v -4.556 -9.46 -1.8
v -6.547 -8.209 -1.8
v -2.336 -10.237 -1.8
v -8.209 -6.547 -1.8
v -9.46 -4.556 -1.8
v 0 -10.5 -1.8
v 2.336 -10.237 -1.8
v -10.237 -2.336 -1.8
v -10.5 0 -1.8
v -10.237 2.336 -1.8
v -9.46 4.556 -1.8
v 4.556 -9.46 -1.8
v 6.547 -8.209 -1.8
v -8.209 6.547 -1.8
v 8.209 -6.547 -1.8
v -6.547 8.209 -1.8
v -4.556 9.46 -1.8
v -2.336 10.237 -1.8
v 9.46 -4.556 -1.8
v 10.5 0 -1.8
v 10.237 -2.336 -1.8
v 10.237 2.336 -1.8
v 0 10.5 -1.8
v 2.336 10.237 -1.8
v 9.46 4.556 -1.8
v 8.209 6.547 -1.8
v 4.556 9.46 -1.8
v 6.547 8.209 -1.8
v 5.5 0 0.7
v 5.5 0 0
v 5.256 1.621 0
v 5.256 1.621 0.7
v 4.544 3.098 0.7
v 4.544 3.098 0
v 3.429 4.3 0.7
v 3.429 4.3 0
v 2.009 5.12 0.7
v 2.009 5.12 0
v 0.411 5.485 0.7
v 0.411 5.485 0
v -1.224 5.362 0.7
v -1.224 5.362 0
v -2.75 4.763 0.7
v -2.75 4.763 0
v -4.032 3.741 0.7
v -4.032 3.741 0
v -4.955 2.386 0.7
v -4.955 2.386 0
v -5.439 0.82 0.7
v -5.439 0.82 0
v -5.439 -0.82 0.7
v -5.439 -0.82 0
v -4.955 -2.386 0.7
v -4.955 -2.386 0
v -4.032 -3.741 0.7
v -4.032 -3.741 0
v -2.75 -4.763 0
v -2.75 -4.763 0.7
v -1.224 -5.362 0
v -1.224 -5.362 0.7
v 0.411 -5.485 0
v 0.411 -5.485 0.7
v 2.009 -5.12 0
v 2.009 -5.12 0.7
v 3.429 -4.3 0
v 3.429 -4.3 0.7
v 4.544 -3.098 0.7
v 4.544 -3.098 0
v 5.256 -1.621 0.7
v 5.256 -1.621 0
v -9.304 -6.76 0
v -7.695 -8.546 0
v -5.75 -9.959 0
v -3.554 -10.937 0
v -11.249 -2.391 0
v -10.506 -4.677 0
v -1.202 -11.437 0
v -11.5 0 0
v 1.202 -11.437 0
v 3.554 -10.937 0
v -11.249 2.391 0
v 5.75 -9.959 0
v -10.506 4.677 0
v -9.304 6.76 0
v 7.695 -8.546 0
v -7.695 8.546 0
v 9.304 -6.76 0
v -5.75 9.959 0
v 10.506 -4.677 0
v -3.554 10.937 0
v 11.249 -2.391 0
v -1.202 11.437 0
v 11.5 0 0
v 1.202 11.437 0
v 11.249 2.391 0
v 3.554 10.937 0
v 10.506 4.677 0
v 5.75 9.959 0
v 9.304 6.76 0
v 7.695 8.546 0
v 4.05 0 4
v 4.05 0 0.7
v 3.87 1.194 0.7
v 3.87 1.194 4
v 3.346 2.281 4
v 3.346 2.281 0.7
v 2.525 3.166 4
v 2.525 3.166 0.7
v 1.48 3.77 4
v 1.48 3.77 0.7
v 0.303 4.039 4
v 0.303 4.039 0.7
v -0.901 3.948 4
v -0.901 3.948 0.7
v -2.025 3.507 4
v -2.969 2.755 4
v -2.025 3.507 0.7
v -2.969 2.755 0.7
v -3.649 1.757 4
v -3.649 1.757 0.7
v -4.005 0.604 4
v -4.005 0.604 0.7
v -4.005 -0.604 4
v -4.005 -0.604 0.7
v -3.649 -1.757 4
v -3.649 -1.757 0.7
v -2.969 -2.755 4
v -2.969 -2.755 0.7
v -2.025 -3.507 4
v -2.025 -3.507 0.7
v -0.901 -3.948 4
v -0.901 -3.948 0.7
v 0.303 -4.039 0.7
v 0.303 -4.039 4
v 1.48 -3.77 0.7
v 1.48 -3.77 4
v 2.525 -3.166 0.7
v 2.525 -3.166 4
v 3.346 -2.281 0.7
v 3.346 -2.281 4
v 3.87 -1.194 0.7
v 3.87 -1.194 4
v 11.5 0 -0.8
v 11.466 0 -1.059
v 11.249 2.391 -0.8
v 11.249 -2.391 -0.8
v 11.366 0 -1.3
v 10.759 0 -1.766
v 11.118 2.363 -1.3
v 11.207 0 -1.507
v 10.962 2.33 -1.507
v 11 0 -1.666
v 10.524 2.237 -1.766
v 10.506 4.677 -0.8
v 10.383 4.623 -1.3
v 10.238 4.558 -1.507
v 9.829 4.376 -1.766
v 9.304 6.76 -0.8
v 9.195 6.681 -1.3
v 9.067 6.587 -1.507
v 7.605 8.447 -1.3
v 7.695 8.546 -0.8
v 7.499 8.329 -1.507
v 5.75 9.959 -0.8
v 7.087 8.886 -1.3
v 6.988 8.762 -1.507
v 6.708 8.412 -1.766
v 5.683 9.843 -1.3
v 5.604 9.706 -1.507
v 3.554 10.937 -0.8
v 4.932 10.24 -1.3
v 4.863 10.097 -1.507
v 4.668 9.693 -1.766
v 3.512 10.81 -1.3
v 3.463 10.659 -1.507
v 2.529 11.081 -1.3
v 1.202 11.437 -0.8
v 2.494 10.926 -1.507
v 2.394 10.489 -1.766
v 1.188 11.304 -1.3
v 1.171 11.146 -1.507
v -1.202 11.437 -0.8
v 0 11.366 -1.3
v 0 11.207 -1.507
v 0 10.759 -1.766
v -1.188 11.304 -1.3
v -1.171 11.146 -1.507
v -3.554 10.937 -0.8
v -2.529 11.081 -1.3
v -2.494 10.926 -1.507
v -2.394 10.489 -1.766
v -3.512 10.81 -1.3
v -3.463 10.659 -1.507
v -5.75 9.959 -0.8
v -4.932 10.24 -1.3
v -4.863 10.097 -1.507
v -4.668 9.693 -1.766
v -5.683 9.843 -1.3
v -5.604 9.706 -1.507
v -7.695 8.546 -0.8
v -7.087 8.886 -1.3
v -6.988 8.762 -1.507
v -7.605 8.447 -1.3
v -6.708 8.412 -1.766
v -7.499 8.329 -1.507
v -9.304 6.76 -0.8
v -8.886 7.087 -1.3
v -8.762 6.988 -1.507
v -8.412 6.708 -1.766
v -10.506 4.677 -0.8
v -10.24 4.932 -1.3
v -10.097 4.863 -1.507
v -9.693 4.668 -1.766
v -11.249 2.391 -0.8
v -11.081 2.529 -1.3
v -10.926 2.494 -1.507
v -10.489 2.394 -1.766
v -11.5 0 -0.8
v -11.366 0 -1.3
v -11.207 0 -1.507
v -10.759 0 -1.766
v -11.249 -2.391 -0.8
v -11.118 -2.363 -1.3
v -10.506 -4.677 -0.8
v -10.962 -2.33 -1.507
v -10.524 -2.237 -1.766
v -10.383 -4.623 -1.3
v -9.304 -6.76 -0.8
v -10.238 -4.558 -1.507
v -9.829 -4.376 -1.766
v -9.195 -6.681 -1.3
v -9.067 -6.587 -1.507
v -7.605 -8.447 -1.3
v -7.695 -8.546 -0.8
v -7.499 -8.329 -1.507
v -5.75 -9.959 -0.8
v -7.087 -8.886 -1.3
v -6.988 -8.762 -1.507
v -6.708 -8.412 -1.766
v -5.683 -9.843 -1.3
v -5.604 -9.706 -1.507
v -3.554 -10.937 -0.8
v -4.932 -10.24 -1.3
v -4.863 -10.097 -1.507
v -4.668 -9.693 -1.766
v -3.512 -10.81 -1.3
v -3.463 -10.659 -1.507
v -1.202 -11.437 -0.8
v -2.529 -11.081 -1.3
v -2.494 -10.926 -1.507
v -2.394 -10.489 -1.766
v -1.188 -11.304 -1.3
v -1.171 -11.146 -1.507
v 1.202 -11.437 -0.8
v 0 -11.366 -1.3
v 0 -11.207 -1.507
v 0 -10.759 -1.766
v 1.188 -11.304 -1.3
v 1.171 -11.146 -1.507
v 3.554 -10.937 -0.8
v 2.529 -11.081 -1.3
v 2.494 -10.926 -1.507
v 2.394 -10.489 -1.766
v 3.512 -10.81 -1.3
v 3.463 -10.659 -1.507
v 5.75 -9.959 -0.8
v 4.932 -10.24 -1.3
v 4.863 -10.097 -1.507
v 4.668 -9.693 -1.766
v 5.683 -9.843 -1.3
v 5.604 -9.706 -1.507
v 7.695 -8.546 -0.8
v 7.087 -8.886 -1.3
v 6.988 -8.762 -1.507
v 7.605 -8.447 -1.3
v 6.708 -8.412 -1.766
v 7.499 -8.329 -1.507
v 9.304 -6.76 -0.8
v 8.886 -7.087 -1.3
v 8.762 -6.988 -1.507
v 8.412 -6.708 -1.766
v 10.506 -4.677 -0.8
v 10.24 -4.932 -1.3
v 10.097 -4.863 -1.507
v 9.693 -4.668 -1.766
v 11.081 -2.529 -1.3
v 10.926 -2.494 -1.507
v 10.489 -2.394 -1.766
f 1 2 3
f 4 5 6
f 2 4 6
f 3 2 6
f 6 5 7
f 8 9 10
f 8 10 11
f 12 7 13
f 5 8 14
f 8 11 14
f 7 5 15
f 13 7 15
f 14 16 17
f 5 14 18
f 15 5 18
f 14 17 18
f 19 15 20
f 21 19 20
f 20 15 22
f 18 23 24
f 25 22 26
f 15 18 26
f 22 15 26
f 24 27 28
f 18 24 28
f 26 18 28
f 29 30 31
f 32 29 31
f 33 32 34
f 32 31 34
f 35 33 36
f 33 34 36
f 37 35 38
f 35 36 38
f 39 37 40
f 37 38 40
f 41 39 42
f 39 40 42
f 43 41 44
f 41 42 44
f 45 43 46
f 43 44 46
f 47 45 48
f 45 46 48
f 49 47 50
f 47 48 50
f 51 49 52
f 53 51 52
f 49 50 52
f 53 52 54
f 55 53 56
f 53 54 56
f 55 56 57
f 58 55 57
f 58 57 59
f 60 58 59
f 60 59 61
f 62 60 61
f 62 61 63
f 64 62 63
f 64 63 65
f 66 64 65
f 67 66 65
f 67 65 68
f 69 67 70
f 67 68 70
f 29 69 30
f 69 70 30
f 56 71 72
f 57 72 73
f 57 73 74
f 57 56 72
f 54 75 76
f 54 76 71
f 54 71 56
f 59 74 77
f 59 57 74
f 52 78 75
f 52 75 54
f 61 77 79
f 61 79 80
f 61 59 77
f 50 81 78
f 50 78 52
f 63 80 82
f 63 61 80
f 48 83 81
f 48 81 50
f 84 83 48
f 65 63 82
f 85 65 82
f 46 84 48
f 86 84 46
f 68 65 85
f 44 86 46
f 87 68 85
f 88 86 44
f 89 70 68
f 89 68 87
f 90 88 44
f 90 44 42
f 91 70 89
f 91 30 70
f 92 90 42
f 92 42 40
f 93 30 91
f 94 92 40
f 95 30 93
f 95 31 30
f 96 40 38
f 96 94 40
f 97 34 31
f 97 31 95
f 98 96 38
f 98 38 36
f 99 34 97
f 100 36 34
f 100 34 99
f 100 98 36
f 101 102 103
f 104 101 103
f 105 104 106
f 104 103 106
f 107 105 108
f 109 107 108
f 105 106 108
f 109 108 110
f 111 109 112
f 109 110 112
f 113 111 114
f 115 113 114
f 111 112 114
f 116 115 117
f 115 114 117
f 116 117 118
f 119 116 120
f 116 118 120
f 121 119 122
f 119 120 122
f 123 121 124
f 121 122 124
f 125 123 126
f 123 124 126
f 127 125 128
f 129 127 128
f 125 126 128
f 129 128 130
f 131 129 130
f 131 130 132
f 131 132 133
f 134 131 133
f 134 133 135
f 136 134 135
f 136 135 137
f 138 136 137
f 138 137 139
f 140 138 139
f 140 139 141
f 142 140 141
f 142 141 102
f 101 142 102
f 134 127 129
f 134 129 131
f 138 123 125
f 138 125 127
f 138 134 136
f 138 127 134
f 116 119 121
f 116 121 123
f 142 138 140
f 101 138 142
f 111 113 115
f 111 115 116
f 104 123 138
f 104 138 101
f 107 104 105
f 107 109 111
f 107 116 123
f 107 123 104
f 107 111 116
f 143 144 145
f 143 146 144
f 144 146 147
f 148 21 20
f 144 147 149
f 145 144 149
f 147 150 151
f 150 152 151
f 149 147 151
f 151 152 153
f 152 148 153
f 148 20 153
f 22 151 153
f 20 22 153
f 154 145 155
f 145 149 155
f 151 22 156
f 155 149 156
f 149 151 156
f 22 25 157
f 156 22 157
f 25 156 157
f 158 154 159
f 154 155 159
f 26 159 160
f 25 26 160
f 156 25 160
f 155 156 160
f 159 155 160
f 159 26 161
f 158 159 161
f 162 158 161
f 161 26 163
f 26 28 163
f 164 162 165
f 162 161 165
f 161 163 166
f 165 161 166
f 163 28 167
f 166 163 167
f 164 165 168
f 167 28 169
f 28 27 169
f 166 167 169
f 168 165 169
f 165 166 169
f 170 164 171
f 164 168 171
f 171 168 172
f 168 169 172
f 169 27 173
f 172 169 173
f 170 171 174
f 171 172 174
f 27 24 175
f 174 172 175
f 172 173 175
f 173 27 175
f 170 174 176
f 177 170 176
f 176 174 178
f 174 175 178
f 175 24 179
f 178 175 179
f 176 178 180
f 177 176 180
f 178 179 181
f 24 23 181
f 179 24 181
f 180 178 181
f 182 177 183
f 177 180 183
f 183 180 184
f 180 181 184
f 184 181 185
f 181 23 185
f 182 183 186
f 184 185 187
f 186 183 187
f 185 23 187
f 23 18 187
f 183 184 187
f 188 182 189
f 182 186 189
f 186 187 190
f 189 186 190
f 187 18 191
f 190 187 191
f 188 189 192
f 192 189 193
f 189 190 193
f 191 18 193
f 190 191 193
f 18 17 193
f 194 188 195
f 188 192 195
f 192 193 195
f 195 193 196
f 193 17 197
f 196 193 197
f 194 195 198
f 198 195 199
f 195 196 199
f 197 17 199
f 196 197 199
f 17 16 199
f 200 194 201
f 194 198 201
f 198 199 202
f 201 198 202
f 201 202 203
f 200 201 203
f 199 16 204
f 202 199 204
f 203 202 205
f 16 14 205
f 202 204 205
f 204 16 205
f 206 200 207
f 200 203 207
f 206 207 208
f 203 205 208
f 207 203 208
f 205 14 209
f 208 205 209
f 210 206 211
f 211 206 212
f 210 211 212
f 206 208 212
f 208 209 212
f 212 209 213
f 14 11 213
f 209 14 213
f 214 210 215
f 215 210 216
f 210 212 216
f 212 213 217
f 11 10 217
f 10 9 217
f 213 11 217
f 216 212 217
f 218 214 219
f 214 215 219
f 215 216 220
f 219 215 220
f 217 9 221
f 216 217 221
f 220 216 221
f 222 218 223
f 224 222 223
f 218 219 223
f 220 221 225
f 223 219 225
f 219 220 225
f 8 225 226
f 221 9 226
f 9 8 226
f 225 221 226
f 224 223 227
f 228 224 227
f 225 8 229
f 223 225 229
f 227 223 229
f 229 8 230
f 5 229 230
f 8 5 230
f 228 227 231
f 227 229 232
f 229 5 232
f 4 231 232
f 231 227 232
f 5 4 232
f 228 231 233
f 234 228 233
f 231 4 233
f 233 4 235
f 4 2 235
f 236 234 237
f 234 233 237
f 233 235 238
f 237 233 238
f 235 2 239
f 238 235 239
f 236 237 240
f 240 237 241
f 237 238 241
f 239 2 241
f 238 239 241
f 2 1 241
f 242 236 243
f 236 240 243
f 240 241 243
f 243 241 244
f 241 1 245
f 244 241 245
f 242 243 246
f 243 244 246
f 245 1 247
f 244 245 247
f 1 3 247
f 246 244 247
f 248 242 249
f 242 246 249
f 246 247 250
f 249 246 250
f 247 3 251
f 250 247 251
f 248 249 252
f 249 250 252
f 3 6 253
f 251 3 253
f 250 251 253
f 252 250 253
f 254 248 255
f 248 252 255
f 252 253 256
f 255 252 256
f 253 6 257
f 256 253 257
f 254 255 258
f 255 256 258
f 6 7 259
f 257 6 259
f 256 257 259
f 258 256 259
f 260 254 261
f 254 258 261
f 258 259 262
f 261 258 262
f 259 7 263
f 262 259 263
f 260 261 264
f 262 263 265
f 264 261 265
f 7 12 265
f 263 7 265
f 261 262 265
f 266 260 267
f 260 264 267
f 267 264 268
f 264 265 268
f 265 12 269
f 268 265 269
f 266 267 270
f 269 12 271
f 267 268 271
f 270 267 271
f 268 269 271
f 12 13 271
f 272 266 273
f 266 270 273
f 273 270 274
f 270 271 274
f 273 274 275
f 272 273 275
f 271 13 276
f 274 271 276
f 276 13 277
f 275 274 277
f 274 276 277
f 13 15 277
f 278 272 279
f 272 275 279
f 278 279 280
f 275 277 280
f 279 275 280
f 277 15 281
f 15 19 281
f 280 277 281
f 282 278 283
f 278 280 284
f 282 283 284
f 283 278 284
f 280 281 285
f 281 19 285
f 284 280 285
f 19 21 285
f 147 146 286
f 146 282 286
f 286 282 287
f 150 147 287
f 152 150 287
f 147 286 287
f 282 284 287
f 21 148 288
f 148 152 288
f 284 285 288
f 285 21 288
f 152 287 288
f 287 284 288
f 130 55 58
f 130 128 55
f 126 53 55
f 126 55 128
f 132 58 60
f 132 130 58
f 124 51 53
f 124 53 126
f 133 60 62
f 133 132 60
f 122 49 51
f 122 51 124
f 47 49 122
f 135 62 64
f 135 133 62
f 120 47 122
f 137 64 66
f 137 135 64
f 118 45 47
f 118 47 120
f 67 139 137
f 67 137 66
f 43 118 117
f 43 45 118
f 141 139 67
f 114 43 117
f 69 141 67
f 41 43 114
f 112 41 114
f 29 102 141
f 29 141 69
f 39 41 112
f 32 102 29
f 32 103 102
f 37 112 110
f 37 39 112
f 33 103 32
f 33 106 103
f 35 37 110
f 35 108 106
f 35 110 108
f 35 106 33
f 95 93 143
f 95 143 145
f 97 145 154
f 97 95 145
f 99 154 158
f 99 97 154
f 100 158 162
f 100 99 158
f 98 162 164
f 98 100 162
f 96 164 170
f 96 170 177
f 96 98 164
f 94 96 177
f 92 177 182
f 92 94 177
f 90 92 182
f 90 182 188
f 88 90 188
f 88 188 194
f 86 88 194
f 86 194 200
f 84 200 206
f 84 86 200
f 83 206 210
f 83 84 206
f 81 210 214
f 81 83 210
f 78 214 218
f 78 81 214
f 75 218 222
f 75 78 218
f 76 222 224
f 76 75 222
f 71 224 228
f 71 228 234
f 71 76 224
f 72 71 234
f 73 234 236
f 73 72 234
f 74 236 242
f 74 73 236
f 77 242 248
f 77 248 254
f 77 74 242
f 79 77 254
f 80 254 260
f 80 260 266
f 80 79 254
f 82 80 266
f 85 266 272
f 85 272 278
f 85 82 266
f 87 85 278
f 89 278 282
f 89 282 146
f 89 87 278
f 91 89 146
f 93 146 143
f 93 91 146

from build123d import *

# Parameters (mm, degrees)
F0_R     = 11.5
F0_R_2   = 5.5
F0_R_3   = 4.05
F1_DEPTH = 1.8
F2_DEPTH = 4
F3_DEPTH = 0.7
F4_R     = 1


with BuildPart() as f1:
    # F0 (on Top) → F1 (new body)
    with BuildSketch(Plane.XY):
        Circle(F0_R)
        Circle(F0_R_2, mode=Mode.SUBTRACT)
        Circle(F0_R_2)
        Circle(F0_R_3, mode=Mode.SUBTRACT)
        Circle(F0_R_3)
    extrude(amount=-F1_DEPTH)

    # F0 (on Top) → F2 (join)
    with BuildSketch(Plane.XY):
        Circle(F0_R_3)
    extrude(amount=F2_DEPTH)

    # F0 (on Top) → F3 (join)
    with BuildSketch(Plane.XY):
        Circle(F0_R_2)
        Circle(F0_R_3, mode=Mode.SUBTRACT)
    extrude(amount=F3_DEPTH)

    # F4
    f4_edges = [f1.edges().sort_by_distance(p)[0] for p in [
        (-11.5, 0, -1.8),
    ]]
    fillet(f4_edges, radius=F4_R)


solid = f1.part
